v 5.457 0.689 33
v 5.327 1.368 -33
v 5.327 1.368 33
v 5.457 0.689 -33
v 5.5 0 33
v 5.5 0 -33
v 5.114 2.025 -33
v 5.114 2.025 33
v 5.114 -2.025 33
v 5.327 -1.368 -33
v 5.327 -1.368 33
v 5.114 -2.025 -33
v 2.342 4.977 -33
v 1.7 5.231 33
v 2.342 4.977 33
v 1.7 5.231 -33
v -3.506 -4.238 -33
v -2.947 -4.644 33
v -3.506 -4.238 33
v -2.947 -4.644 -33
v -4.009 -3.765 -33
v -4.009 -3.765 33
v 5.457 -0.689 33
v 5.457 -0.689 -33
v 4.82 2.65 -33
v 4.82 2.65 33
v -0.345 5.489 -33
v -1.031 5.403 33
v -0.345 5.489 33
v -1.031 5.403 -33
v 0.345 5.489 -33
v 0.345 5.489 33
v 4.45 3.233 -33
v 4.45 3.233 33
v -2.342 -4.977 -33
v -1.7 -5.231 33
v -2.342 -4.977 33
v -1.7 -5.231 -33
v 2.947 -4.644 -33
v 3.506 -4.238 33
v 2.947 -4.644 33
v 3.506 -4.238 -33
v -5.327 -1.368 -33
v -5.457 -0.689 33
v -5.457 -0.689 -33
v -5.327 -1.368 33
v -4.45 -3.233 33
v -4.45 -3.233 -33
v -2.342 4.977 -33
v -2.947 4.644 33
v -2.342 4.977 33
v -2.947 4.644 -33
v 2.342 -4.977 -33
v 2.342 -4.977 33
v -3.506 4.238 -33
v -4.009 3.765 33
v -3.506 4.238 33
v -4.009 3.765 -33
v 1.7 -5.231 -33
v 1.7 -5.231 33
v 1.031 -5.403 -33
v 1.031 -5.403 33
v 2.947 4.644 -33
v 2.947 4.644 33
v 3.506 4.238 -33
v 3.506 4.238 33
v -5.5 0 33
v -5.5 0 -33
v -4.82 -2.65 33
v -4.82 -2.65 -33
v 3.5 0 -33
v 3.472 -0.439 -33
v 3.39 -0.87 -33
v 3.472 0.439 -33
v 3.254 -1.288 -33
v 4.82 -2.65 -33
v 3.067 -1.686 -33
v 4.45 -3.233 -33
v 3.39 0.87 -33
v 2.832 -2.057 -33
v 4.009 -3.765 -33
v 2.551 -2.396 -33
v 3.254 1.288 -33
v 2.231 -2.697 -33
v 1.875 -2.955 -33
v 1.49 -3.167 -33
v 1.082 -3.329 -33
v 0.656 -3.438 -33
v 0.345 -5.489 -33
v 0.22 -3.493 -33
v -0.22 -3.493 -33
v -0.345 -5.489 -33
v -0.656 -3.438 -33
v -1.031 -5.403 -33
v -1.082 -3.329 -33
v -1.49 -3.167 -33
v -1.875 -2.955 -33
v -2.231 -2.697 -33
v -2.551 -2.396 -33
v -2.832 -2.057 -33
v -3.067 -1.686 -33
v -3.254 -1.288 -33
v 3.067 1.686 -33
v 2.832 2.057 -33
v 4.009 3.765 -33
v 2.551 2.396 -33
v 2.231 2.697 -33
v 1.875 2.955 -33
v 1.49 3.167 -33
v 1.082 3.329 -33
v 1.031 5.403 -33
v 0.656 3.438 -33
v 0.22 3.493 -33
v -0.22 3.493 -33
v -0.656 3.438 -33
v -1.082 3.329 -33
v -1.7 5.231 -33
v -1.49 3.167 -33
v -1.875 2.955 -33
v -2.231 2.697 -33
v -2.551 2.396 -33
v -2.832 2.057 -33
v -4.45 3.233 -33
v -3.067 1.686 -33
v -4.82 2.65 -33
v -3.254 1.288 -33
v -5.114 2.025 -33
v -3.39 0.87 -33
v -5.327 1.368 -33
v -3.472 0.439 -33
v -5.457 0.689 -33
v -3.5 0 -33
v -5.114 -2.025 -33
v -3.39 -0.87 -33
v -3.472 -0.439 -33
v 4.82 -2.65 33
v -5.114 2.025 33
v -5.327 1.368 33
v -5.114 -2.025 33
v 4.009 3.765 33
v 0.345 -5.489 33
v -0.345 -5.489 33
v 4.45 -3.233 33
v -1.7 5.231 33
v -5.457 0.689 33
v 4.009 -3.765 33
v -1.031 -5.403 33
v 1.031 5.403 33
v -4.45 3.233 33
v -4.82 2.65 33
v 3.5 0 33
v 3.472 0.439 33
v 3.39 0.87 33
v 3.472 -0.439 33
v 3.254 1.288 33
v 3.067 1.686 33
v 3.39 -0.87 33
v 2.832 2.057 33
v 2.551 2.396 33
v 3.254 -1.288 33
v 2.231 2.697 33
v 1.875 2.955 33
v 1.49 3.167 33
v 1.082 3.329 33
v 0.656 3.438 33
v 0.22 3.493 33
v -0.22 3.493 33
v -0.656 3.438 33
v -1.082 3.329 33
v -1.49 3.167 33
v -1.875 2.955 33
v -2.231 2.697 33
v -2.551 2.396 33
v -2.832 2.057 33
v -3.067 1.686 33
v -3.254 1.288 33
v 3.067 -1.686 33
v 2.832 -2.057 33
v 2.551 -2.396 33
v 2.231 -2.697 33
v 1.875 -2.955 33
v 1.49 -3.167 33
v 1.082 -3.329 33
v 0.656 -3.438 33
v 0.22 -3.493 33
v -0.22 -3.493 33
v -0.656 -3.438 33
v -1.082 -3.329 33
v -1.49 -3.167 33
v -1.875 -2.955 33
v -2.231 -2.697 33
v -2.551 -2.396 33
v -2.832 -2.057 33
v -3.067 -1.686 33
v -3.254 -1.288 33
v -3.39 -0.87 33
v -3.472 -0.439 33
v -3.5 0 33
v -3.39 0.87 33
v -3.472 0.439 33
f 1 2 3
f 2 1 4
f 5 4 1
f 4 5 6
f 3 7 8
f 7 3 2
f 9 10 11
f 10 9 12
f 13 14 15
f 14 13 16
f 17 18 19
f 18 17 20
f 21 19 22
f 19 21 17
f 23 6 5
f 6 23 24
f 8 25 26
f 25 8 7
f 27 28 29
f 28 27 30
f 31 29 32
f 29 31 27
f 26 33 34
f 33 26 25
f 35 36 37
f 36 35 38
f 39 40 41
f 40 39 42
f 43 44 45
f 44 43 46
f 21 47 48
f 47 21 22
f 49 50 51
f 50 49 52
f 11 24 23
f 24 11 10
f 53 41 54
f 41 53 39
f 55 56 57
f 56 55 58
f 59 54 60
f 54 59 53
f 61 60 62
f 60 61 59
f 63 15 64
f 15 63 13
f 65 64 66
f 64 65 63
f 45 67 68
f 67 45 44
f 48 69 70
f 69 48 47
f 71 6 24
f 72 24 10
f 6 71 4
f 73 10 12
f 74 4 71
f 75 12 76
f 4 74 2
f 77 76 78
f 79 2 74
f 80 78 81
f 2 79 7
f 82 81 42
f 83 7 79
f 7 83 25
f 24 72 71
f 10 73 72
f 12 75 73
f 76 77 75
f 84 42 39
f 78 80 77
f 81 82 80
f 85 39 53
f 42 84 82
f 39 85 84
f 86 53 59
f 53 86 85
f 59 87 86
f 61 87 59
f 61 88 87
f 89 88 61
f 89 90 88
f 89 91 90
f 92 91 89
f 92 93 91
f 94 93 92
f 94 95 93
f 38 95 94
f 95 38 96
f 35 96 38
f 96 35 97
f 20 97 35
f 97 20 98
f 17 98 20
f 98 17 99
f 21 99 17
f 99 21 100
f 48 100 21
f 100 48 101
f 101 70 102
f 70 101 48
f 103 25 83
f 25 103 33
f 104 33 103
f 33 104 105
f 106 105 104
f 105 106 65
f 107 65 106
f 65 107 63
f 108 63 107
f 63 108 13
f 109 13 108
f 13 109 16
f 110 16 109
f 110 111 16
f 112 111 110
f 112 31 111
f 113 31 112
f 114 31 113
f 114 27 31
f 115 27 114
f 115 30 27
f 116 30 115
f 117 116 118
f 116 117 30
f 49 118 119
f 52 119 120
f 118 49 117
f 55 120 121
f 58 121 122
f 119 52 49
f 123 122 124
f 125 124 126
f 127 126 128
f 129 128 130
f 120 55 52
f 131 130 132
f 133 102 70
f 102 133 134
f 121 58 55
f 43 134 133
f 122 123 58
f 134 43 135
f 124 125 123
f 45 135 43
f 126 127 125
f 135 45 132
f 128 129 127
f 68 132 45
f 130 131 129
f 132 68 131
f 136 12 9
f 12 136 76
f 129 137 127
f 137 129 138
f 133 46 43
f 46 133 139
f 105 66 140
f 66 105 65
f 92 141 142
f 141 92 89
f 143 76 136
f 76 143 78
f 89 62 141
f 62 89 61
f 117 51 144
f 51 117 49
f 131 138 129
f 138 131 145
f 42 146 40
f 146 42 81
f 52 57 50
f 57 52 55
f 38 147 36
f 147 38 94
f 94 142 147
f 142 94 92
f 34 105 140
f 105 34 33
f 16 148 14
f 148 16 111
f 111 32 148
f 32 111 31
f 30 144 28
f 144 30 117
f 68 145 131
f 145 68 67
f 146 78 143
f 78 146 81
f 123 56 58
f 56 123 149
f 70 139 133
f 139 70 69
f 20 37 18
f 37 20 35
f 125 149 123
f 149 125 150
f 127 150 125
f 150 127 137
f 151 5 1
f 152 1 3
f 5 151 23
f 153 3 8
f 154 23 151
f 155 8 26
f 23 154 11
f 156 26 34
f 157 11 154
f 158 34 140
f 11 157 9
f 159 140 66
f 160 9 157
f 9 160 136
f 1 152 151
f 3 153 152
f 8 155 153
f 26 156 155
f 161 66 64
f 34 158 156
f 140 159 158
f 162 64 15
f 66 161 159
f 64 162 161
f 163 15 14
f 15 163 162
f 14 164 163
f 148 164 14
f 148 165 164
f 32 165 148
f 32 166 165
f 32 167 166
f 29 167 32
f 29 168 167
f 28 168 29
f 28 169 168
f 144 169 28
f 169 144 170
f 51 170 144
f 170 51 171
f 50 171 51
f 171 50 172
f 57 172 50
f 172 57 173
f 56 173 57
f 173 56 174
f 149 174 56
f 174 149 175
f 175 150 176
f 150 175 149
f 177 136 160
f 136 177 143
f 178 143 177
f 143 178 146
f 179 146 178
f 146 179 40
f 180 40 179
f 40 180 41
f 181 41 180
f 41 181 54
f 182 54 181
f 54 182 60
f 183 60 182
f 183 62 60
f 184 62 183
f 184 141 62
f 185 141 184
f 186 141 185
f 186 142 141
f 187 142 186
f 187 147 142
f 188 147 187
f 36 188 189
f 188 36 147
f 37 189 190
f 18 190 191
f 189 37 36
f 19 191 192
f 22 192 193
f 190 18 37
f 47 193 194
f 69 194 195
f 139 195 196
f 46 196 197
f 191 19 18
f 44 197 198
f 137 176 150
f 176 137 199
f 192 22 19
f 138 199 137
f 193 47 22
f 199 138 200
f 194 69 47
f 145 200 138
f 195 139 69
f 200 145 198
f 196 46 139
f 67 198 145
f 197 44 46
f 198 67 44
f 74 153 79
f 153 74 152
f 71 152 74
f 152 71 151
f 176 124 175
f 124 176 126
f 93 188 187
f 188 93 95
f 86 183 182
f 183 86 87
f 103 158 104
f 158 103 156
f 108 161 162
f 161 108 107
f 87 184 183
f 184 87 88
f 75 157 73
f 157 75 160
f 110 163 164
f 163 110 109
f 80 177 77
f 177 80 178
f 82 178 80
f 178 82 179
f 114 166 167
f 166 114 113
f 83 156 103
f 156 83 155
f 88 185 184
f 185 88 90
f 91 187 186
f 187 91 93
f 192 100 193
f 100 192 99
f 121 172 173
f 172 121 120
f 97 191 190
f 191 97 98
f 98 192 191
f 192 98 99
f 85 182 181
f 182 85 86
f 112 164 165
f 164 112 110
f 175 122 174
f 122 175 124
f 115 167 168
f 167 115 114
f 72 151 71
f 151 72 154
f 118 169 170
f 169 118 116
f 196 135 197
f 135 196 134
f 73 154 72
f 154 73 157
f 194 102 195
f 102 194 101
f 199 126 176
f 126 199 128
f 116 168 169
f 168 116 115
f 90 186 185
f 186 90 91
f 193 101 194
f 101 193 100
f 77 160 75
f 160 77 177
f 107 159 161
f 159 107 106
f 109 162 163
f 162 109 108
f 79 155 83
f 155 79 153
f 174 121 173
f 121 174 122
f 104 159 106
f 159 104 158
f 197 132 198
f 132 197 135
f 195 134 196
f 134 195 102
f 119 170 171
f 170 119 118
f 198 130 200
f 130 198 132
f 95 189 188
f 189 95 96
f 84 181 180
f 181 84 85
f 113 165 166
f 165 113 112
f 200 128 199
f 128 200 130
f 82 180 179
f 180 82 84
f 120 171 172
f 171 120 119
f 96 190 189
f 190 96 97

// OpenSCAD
$fn = 50;


difference() {
	union() {
		translate(v = [0, 0, -33.0000000000]) {
			cylinder(h = 66, r = 5.5000000000);
		}
	}
	union() {
		translate(v = [0, 0, -100.0000000000]) {
			cylinder(h = 200, r = 3.5000000000);
		}
	}
}
